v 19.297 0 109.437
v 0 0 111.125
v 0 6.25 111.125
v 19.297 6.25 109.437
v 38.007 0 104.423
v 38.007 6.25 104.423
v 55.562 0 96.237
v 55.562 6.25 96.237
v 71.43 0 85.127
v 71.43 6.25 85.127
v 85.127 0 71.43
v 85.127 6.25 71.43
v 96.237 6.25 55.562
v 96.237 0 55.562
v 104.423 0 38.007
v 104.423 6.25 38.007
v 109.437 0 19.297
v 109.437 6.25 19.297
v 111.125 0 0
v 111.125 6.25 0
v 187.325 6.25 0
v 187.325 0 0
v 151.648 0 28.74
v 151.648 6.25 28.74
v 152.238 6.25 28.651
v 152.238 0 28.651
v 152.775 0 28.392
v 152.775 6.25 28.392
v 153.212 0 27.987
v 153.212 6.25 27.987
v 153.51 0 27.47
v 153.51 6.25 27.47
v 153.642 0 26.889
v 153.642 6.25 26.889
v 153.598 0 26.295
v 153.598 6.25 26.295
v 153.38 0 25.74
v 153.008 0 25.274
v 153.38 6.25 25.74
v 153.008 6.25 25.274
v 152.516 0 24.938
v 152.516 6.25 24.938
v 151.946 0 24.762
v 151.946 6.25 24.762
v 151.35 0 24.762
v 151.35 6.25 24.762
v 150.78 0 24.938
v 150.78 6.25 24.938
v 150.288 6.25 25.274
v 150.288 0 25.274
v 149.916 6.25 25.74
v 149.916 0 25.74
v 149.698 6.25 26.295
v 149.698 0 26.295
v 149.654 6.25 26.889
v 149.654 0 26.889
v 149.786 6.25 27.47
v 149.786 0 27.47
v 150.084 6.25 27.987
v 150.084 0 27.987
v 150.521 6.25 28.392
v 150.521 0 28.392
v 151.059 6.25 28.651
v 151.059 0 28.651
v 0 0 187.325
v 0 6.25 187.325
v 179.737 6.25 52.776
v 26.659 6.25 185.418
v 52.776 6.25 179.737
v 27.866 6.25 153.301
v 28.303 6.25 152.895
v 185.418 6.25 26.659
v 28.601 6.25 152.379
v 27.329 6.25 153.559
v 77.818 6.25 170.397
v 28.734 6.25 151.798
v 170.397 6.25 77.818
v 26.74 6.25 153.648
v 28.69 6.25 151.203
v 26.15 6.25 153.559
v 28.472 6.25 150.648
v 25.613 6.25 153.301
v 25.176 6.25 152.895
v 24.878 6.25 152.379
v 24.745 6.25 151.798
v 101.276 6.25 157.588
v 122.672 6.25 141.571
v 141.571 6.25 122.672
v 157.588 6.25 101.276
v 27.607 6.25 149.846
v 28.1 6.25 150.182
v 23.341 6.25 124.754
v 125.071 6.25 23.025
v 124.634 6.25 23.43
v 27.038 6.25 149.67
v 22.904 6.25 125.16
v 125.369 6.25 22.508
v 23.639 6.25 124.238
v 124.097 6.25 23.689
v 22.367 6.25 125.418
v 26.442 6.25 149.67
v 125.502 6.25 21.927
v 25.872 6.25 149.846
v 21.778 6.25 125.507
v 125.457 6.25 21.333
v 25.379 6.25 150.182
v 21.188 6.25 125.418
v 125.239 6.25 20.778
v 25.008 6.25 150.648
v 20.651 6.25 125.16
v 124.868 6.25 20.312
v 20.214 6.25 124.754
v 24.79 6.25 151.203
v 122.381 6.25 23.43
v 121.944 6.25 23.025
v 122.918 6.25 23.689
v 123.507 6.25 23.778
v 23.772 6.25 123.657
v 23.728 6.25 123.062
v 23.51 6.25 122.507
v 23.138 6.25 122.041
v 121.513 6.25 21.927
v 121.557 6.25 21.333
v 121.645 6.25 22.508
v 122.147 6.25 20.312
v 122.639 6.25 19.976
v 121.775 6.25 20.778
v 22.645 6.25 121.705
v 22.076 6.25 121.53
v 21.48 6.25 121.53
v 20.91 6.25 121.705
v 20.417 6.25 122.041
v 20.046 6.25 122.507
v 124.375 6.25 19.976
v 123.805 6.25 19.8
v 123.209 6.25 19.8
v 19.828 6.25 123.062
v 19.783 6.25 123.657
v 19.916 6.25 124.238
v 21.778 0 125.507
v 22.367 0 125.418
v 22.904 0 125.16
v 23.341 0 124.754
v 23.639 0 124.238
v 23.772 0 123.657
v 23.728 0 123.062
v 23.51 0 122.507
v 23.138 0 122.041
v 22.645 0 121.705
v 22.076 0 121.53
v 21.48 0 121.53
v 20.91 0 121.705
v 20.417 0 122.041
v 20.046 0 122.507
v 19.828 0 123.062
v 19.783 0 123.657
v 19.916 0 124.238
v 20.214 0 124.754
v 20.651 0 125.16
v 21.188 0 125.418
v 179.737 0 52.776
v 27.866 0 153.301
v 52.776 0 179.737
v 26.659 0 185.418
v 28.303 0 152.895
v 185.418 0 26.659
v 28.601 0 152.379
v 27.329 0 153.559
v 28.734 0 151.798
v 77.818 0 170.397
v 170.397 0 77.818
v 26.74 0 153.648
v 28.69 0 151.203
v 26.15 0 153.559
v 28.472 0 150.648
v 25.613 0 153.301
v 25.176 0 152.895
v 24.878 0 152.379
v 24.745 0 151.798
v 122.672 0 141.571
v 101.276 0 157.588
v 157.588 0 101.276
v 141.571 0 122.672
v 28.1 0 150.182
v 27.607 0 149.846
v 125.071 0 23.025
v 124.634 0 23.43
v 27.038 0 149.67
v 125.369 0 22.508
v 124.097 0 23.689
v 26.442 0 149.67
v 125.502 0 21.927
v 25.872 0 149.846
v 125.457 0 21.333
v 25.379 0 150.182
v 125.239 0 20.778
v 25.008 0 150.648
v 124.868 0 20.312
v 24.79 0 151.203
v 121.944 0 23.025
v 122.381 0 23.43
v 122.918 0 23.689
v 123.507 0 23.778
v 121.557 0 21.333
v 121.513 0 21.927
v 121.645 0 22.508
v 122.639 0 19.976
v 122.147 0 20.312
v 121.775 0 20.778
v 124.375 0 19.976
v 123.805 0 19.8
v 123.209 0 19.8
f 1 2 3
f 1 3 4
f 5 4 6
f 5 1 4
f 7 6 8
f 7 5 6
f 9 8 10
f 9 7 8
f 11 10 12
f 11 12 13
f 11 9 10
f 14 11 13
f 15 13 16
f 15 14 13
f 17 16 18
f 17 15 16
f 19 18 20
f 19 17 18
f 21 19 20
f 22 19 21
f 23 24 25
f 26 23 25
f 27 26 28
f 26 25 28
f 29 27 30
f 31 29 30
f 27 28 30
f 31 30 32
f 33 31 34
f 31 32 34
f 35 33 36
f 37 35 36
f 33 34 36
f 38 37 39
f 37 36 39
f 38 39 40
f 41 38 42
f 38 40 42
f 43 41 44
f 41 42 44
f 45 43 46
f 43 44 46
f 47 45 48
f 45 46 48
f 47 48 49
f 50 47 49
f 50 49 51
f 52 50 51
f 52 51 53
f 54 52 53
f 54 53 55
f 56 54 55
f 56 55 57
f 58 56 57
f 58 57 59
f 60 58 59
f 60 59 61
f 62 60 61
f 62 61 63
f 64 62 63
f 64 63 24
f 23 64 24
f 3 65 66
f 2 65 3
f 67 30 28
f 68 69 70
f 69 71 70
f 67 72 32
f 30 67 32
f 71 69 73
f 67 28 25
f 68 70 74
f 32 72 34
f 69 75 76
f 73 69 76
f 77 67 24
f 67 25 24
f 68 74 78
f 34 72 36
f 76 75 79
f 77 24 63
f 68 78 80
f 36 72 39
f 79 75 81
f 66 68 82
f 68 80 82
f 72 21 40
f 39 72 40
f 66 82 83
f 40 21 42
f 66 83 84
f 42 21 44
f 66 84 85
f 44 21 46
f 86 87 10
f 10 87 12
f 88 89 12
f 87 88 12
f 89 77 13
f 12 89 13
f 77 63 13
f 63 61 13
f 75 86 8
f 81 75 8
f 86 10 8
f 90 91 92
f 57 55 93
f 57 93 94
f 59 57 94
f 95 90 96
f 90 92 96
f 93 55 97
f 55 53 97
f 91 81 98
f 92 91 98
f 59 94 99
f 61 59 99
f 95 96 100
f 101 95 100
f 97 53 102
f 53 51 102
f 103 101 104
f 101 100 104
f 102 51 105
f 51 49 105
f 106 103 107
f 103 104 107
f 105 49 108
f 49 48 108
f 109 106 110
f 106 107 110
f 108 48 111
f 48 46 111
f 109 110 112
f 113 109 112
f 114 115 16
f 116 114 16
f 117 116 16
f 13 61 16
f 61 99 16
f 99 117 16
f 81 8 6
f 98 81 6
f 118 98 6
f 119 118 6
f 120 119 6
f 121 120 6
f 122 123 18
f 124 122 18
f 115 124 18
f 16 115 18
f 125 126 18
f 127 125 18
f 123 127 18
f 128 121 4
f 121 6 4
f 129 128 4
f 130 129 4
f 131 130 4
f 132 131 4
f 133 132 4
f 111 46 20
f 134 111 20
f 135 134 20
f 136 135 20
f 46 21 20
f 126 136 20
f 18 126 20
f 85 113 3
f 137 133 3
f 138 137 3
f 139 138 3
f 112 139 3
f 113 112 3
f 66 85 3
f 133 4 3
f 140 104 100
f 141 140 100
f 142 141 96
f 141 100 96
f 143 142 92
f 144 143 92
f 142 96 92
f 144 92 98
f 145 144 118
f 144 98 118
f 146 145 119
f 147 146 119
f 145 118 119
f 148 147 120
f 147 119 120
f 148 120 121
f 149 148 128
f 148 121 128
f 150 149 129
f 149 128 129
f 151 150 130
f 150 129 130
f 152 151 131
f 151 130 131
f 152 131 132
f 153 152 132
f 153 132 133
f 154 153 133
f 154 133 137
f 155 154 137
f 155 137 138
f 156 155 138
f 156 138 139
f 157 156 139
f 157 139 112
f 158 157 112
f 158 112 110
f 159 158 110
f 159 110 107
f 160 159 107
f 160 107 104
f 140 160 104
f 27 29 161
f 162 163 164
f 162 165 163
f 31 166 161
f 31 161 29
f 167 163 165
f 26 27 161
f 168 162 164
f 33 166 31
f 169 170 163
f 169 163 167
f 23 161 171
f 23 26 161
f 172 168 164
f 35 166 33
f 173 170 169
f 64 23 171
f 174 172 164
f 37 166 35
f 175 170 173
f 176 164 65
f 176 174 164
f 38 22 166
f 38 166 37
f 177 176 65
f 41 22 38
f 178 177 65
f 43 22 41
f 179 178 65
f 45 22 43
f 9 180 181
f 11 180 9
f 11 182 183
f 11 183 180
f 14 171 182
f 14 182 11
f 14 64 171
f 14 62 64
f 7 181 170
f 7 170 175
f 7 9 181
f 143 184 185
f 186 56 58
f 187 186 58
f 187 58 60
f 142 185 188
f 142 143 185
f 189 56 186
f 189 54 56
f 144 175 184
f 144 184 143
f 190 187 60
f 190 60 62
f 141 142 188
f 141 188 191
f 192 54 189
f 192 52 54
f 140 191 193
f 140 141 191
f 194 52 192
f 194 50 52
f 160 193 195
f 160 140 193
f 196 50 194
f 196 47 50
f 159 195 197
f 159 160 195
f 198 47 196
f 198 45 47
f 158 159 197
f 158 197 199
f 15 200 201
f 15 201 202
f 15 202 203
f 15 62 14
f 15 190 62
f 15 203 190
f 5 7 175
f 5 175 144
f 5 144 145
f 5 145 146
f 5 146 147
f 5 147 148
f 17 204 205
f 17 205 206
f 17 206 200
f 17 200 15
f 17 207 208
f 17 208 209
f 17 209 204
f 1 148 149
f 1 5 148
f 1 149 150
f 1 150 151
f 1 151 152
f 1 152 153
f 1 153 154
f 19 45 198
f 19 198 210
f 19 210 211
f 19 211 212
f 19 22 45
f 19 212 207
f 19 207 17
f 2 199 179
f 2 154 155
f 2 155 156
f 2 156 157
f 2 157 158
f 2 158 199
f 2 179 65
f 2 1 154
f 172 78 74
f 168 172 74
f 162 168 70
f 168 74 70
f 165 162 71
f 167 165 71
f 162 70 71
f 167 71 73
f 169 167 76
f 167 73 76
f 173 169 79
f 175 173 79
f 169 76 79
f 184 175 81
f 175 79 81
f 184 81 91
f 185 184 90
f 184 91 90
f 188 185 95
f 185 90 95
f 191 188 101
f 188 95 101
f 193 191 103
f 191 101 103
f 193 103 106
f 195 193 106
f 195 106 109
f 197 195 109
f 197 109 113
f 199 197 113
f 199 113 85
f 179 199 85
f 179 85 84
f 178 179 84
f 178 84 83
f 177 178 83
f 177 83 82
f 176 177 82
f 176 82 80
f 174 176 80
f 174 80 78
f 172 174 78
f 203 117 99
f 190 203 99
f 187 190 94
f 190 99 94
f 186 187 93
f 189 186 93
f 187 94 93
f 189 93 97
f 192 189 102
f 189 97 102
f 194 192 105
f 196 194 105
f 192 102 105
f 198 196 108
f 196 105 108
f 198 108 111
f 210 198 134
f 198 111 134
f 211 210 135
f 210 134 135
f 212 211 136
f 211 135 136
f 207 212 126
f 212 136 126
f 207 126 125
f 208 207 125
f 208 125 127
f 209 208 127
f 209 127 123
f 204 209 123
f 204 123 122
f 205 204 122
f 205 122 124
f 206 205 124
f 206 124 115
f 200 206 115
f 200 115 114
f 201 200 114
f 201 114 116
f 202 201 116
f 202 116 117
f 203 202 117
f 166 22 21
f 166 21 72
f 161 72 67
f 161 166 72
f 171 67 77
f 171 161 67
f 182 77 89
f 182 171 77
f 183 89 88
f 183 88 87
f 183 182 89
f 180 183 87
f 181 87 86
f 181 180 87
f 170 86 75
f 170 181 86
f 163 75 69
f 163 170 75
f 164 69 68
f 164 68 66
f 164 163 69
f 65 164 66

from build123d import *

# Parameters (mm, degrees)
BOSS_EXTRUDE1_DEPTH = 6.25
SKETCH2_R           = 2
CUT_EXTRUDE1_DEPTH  = 6.35


with BuildPart() as part:
    # Sketch1 → Boss-Extrude1 (new body)
    with BuildSketch(Plane(origin=(0, 0, 0), x_dir=(1, 0, 0), z_dir=(0, 1, 0))):
        with BuildLine():
            Line((111.125, 0), (187.325, 0))
            ThreePointArc((187.325, 0), (132.458777786, -132.458777786), (0, -187.325))
            Line((0, -187.325), (0, -111.125))
            ThreePointArc((0, -111.125), (78.577241059, -78.577241059), (111.125, 0))
        make_face()
    extrude(amount=BOSS_EXTRUDE1_DEPTH)

    # Sketch2 → Cut-Extrude1 (cut)
    with BuildSketch(Plane(origin=(0, 6.25, 0), x_dir=(1, 0, 0), z_dir=(0, 1, 0))):
        with Locations(Location((21.777652082, -123.507202325, 0), (0, 0, 270))):
            Circle(SKETCH2_R)
        with Locations(Location((123.507202325, -21.777652082, 0), (0, 0, 270))):
            Circle(SKETCH2_R)
        with Locations(Location((26.739648758, -151.648083867, 0), (0, 0, 270))):
            Circle(SKETCH2_R)
        with Locations(Location((151.648083867, -26.739648758, 0), (0, 0, 270))):
            Circle(SKETCH2_R)
    extrude(amount=-CUT_EXTRUDE1_DEPTH, mode=Mode.SUBTRACT)


solid = part.part
